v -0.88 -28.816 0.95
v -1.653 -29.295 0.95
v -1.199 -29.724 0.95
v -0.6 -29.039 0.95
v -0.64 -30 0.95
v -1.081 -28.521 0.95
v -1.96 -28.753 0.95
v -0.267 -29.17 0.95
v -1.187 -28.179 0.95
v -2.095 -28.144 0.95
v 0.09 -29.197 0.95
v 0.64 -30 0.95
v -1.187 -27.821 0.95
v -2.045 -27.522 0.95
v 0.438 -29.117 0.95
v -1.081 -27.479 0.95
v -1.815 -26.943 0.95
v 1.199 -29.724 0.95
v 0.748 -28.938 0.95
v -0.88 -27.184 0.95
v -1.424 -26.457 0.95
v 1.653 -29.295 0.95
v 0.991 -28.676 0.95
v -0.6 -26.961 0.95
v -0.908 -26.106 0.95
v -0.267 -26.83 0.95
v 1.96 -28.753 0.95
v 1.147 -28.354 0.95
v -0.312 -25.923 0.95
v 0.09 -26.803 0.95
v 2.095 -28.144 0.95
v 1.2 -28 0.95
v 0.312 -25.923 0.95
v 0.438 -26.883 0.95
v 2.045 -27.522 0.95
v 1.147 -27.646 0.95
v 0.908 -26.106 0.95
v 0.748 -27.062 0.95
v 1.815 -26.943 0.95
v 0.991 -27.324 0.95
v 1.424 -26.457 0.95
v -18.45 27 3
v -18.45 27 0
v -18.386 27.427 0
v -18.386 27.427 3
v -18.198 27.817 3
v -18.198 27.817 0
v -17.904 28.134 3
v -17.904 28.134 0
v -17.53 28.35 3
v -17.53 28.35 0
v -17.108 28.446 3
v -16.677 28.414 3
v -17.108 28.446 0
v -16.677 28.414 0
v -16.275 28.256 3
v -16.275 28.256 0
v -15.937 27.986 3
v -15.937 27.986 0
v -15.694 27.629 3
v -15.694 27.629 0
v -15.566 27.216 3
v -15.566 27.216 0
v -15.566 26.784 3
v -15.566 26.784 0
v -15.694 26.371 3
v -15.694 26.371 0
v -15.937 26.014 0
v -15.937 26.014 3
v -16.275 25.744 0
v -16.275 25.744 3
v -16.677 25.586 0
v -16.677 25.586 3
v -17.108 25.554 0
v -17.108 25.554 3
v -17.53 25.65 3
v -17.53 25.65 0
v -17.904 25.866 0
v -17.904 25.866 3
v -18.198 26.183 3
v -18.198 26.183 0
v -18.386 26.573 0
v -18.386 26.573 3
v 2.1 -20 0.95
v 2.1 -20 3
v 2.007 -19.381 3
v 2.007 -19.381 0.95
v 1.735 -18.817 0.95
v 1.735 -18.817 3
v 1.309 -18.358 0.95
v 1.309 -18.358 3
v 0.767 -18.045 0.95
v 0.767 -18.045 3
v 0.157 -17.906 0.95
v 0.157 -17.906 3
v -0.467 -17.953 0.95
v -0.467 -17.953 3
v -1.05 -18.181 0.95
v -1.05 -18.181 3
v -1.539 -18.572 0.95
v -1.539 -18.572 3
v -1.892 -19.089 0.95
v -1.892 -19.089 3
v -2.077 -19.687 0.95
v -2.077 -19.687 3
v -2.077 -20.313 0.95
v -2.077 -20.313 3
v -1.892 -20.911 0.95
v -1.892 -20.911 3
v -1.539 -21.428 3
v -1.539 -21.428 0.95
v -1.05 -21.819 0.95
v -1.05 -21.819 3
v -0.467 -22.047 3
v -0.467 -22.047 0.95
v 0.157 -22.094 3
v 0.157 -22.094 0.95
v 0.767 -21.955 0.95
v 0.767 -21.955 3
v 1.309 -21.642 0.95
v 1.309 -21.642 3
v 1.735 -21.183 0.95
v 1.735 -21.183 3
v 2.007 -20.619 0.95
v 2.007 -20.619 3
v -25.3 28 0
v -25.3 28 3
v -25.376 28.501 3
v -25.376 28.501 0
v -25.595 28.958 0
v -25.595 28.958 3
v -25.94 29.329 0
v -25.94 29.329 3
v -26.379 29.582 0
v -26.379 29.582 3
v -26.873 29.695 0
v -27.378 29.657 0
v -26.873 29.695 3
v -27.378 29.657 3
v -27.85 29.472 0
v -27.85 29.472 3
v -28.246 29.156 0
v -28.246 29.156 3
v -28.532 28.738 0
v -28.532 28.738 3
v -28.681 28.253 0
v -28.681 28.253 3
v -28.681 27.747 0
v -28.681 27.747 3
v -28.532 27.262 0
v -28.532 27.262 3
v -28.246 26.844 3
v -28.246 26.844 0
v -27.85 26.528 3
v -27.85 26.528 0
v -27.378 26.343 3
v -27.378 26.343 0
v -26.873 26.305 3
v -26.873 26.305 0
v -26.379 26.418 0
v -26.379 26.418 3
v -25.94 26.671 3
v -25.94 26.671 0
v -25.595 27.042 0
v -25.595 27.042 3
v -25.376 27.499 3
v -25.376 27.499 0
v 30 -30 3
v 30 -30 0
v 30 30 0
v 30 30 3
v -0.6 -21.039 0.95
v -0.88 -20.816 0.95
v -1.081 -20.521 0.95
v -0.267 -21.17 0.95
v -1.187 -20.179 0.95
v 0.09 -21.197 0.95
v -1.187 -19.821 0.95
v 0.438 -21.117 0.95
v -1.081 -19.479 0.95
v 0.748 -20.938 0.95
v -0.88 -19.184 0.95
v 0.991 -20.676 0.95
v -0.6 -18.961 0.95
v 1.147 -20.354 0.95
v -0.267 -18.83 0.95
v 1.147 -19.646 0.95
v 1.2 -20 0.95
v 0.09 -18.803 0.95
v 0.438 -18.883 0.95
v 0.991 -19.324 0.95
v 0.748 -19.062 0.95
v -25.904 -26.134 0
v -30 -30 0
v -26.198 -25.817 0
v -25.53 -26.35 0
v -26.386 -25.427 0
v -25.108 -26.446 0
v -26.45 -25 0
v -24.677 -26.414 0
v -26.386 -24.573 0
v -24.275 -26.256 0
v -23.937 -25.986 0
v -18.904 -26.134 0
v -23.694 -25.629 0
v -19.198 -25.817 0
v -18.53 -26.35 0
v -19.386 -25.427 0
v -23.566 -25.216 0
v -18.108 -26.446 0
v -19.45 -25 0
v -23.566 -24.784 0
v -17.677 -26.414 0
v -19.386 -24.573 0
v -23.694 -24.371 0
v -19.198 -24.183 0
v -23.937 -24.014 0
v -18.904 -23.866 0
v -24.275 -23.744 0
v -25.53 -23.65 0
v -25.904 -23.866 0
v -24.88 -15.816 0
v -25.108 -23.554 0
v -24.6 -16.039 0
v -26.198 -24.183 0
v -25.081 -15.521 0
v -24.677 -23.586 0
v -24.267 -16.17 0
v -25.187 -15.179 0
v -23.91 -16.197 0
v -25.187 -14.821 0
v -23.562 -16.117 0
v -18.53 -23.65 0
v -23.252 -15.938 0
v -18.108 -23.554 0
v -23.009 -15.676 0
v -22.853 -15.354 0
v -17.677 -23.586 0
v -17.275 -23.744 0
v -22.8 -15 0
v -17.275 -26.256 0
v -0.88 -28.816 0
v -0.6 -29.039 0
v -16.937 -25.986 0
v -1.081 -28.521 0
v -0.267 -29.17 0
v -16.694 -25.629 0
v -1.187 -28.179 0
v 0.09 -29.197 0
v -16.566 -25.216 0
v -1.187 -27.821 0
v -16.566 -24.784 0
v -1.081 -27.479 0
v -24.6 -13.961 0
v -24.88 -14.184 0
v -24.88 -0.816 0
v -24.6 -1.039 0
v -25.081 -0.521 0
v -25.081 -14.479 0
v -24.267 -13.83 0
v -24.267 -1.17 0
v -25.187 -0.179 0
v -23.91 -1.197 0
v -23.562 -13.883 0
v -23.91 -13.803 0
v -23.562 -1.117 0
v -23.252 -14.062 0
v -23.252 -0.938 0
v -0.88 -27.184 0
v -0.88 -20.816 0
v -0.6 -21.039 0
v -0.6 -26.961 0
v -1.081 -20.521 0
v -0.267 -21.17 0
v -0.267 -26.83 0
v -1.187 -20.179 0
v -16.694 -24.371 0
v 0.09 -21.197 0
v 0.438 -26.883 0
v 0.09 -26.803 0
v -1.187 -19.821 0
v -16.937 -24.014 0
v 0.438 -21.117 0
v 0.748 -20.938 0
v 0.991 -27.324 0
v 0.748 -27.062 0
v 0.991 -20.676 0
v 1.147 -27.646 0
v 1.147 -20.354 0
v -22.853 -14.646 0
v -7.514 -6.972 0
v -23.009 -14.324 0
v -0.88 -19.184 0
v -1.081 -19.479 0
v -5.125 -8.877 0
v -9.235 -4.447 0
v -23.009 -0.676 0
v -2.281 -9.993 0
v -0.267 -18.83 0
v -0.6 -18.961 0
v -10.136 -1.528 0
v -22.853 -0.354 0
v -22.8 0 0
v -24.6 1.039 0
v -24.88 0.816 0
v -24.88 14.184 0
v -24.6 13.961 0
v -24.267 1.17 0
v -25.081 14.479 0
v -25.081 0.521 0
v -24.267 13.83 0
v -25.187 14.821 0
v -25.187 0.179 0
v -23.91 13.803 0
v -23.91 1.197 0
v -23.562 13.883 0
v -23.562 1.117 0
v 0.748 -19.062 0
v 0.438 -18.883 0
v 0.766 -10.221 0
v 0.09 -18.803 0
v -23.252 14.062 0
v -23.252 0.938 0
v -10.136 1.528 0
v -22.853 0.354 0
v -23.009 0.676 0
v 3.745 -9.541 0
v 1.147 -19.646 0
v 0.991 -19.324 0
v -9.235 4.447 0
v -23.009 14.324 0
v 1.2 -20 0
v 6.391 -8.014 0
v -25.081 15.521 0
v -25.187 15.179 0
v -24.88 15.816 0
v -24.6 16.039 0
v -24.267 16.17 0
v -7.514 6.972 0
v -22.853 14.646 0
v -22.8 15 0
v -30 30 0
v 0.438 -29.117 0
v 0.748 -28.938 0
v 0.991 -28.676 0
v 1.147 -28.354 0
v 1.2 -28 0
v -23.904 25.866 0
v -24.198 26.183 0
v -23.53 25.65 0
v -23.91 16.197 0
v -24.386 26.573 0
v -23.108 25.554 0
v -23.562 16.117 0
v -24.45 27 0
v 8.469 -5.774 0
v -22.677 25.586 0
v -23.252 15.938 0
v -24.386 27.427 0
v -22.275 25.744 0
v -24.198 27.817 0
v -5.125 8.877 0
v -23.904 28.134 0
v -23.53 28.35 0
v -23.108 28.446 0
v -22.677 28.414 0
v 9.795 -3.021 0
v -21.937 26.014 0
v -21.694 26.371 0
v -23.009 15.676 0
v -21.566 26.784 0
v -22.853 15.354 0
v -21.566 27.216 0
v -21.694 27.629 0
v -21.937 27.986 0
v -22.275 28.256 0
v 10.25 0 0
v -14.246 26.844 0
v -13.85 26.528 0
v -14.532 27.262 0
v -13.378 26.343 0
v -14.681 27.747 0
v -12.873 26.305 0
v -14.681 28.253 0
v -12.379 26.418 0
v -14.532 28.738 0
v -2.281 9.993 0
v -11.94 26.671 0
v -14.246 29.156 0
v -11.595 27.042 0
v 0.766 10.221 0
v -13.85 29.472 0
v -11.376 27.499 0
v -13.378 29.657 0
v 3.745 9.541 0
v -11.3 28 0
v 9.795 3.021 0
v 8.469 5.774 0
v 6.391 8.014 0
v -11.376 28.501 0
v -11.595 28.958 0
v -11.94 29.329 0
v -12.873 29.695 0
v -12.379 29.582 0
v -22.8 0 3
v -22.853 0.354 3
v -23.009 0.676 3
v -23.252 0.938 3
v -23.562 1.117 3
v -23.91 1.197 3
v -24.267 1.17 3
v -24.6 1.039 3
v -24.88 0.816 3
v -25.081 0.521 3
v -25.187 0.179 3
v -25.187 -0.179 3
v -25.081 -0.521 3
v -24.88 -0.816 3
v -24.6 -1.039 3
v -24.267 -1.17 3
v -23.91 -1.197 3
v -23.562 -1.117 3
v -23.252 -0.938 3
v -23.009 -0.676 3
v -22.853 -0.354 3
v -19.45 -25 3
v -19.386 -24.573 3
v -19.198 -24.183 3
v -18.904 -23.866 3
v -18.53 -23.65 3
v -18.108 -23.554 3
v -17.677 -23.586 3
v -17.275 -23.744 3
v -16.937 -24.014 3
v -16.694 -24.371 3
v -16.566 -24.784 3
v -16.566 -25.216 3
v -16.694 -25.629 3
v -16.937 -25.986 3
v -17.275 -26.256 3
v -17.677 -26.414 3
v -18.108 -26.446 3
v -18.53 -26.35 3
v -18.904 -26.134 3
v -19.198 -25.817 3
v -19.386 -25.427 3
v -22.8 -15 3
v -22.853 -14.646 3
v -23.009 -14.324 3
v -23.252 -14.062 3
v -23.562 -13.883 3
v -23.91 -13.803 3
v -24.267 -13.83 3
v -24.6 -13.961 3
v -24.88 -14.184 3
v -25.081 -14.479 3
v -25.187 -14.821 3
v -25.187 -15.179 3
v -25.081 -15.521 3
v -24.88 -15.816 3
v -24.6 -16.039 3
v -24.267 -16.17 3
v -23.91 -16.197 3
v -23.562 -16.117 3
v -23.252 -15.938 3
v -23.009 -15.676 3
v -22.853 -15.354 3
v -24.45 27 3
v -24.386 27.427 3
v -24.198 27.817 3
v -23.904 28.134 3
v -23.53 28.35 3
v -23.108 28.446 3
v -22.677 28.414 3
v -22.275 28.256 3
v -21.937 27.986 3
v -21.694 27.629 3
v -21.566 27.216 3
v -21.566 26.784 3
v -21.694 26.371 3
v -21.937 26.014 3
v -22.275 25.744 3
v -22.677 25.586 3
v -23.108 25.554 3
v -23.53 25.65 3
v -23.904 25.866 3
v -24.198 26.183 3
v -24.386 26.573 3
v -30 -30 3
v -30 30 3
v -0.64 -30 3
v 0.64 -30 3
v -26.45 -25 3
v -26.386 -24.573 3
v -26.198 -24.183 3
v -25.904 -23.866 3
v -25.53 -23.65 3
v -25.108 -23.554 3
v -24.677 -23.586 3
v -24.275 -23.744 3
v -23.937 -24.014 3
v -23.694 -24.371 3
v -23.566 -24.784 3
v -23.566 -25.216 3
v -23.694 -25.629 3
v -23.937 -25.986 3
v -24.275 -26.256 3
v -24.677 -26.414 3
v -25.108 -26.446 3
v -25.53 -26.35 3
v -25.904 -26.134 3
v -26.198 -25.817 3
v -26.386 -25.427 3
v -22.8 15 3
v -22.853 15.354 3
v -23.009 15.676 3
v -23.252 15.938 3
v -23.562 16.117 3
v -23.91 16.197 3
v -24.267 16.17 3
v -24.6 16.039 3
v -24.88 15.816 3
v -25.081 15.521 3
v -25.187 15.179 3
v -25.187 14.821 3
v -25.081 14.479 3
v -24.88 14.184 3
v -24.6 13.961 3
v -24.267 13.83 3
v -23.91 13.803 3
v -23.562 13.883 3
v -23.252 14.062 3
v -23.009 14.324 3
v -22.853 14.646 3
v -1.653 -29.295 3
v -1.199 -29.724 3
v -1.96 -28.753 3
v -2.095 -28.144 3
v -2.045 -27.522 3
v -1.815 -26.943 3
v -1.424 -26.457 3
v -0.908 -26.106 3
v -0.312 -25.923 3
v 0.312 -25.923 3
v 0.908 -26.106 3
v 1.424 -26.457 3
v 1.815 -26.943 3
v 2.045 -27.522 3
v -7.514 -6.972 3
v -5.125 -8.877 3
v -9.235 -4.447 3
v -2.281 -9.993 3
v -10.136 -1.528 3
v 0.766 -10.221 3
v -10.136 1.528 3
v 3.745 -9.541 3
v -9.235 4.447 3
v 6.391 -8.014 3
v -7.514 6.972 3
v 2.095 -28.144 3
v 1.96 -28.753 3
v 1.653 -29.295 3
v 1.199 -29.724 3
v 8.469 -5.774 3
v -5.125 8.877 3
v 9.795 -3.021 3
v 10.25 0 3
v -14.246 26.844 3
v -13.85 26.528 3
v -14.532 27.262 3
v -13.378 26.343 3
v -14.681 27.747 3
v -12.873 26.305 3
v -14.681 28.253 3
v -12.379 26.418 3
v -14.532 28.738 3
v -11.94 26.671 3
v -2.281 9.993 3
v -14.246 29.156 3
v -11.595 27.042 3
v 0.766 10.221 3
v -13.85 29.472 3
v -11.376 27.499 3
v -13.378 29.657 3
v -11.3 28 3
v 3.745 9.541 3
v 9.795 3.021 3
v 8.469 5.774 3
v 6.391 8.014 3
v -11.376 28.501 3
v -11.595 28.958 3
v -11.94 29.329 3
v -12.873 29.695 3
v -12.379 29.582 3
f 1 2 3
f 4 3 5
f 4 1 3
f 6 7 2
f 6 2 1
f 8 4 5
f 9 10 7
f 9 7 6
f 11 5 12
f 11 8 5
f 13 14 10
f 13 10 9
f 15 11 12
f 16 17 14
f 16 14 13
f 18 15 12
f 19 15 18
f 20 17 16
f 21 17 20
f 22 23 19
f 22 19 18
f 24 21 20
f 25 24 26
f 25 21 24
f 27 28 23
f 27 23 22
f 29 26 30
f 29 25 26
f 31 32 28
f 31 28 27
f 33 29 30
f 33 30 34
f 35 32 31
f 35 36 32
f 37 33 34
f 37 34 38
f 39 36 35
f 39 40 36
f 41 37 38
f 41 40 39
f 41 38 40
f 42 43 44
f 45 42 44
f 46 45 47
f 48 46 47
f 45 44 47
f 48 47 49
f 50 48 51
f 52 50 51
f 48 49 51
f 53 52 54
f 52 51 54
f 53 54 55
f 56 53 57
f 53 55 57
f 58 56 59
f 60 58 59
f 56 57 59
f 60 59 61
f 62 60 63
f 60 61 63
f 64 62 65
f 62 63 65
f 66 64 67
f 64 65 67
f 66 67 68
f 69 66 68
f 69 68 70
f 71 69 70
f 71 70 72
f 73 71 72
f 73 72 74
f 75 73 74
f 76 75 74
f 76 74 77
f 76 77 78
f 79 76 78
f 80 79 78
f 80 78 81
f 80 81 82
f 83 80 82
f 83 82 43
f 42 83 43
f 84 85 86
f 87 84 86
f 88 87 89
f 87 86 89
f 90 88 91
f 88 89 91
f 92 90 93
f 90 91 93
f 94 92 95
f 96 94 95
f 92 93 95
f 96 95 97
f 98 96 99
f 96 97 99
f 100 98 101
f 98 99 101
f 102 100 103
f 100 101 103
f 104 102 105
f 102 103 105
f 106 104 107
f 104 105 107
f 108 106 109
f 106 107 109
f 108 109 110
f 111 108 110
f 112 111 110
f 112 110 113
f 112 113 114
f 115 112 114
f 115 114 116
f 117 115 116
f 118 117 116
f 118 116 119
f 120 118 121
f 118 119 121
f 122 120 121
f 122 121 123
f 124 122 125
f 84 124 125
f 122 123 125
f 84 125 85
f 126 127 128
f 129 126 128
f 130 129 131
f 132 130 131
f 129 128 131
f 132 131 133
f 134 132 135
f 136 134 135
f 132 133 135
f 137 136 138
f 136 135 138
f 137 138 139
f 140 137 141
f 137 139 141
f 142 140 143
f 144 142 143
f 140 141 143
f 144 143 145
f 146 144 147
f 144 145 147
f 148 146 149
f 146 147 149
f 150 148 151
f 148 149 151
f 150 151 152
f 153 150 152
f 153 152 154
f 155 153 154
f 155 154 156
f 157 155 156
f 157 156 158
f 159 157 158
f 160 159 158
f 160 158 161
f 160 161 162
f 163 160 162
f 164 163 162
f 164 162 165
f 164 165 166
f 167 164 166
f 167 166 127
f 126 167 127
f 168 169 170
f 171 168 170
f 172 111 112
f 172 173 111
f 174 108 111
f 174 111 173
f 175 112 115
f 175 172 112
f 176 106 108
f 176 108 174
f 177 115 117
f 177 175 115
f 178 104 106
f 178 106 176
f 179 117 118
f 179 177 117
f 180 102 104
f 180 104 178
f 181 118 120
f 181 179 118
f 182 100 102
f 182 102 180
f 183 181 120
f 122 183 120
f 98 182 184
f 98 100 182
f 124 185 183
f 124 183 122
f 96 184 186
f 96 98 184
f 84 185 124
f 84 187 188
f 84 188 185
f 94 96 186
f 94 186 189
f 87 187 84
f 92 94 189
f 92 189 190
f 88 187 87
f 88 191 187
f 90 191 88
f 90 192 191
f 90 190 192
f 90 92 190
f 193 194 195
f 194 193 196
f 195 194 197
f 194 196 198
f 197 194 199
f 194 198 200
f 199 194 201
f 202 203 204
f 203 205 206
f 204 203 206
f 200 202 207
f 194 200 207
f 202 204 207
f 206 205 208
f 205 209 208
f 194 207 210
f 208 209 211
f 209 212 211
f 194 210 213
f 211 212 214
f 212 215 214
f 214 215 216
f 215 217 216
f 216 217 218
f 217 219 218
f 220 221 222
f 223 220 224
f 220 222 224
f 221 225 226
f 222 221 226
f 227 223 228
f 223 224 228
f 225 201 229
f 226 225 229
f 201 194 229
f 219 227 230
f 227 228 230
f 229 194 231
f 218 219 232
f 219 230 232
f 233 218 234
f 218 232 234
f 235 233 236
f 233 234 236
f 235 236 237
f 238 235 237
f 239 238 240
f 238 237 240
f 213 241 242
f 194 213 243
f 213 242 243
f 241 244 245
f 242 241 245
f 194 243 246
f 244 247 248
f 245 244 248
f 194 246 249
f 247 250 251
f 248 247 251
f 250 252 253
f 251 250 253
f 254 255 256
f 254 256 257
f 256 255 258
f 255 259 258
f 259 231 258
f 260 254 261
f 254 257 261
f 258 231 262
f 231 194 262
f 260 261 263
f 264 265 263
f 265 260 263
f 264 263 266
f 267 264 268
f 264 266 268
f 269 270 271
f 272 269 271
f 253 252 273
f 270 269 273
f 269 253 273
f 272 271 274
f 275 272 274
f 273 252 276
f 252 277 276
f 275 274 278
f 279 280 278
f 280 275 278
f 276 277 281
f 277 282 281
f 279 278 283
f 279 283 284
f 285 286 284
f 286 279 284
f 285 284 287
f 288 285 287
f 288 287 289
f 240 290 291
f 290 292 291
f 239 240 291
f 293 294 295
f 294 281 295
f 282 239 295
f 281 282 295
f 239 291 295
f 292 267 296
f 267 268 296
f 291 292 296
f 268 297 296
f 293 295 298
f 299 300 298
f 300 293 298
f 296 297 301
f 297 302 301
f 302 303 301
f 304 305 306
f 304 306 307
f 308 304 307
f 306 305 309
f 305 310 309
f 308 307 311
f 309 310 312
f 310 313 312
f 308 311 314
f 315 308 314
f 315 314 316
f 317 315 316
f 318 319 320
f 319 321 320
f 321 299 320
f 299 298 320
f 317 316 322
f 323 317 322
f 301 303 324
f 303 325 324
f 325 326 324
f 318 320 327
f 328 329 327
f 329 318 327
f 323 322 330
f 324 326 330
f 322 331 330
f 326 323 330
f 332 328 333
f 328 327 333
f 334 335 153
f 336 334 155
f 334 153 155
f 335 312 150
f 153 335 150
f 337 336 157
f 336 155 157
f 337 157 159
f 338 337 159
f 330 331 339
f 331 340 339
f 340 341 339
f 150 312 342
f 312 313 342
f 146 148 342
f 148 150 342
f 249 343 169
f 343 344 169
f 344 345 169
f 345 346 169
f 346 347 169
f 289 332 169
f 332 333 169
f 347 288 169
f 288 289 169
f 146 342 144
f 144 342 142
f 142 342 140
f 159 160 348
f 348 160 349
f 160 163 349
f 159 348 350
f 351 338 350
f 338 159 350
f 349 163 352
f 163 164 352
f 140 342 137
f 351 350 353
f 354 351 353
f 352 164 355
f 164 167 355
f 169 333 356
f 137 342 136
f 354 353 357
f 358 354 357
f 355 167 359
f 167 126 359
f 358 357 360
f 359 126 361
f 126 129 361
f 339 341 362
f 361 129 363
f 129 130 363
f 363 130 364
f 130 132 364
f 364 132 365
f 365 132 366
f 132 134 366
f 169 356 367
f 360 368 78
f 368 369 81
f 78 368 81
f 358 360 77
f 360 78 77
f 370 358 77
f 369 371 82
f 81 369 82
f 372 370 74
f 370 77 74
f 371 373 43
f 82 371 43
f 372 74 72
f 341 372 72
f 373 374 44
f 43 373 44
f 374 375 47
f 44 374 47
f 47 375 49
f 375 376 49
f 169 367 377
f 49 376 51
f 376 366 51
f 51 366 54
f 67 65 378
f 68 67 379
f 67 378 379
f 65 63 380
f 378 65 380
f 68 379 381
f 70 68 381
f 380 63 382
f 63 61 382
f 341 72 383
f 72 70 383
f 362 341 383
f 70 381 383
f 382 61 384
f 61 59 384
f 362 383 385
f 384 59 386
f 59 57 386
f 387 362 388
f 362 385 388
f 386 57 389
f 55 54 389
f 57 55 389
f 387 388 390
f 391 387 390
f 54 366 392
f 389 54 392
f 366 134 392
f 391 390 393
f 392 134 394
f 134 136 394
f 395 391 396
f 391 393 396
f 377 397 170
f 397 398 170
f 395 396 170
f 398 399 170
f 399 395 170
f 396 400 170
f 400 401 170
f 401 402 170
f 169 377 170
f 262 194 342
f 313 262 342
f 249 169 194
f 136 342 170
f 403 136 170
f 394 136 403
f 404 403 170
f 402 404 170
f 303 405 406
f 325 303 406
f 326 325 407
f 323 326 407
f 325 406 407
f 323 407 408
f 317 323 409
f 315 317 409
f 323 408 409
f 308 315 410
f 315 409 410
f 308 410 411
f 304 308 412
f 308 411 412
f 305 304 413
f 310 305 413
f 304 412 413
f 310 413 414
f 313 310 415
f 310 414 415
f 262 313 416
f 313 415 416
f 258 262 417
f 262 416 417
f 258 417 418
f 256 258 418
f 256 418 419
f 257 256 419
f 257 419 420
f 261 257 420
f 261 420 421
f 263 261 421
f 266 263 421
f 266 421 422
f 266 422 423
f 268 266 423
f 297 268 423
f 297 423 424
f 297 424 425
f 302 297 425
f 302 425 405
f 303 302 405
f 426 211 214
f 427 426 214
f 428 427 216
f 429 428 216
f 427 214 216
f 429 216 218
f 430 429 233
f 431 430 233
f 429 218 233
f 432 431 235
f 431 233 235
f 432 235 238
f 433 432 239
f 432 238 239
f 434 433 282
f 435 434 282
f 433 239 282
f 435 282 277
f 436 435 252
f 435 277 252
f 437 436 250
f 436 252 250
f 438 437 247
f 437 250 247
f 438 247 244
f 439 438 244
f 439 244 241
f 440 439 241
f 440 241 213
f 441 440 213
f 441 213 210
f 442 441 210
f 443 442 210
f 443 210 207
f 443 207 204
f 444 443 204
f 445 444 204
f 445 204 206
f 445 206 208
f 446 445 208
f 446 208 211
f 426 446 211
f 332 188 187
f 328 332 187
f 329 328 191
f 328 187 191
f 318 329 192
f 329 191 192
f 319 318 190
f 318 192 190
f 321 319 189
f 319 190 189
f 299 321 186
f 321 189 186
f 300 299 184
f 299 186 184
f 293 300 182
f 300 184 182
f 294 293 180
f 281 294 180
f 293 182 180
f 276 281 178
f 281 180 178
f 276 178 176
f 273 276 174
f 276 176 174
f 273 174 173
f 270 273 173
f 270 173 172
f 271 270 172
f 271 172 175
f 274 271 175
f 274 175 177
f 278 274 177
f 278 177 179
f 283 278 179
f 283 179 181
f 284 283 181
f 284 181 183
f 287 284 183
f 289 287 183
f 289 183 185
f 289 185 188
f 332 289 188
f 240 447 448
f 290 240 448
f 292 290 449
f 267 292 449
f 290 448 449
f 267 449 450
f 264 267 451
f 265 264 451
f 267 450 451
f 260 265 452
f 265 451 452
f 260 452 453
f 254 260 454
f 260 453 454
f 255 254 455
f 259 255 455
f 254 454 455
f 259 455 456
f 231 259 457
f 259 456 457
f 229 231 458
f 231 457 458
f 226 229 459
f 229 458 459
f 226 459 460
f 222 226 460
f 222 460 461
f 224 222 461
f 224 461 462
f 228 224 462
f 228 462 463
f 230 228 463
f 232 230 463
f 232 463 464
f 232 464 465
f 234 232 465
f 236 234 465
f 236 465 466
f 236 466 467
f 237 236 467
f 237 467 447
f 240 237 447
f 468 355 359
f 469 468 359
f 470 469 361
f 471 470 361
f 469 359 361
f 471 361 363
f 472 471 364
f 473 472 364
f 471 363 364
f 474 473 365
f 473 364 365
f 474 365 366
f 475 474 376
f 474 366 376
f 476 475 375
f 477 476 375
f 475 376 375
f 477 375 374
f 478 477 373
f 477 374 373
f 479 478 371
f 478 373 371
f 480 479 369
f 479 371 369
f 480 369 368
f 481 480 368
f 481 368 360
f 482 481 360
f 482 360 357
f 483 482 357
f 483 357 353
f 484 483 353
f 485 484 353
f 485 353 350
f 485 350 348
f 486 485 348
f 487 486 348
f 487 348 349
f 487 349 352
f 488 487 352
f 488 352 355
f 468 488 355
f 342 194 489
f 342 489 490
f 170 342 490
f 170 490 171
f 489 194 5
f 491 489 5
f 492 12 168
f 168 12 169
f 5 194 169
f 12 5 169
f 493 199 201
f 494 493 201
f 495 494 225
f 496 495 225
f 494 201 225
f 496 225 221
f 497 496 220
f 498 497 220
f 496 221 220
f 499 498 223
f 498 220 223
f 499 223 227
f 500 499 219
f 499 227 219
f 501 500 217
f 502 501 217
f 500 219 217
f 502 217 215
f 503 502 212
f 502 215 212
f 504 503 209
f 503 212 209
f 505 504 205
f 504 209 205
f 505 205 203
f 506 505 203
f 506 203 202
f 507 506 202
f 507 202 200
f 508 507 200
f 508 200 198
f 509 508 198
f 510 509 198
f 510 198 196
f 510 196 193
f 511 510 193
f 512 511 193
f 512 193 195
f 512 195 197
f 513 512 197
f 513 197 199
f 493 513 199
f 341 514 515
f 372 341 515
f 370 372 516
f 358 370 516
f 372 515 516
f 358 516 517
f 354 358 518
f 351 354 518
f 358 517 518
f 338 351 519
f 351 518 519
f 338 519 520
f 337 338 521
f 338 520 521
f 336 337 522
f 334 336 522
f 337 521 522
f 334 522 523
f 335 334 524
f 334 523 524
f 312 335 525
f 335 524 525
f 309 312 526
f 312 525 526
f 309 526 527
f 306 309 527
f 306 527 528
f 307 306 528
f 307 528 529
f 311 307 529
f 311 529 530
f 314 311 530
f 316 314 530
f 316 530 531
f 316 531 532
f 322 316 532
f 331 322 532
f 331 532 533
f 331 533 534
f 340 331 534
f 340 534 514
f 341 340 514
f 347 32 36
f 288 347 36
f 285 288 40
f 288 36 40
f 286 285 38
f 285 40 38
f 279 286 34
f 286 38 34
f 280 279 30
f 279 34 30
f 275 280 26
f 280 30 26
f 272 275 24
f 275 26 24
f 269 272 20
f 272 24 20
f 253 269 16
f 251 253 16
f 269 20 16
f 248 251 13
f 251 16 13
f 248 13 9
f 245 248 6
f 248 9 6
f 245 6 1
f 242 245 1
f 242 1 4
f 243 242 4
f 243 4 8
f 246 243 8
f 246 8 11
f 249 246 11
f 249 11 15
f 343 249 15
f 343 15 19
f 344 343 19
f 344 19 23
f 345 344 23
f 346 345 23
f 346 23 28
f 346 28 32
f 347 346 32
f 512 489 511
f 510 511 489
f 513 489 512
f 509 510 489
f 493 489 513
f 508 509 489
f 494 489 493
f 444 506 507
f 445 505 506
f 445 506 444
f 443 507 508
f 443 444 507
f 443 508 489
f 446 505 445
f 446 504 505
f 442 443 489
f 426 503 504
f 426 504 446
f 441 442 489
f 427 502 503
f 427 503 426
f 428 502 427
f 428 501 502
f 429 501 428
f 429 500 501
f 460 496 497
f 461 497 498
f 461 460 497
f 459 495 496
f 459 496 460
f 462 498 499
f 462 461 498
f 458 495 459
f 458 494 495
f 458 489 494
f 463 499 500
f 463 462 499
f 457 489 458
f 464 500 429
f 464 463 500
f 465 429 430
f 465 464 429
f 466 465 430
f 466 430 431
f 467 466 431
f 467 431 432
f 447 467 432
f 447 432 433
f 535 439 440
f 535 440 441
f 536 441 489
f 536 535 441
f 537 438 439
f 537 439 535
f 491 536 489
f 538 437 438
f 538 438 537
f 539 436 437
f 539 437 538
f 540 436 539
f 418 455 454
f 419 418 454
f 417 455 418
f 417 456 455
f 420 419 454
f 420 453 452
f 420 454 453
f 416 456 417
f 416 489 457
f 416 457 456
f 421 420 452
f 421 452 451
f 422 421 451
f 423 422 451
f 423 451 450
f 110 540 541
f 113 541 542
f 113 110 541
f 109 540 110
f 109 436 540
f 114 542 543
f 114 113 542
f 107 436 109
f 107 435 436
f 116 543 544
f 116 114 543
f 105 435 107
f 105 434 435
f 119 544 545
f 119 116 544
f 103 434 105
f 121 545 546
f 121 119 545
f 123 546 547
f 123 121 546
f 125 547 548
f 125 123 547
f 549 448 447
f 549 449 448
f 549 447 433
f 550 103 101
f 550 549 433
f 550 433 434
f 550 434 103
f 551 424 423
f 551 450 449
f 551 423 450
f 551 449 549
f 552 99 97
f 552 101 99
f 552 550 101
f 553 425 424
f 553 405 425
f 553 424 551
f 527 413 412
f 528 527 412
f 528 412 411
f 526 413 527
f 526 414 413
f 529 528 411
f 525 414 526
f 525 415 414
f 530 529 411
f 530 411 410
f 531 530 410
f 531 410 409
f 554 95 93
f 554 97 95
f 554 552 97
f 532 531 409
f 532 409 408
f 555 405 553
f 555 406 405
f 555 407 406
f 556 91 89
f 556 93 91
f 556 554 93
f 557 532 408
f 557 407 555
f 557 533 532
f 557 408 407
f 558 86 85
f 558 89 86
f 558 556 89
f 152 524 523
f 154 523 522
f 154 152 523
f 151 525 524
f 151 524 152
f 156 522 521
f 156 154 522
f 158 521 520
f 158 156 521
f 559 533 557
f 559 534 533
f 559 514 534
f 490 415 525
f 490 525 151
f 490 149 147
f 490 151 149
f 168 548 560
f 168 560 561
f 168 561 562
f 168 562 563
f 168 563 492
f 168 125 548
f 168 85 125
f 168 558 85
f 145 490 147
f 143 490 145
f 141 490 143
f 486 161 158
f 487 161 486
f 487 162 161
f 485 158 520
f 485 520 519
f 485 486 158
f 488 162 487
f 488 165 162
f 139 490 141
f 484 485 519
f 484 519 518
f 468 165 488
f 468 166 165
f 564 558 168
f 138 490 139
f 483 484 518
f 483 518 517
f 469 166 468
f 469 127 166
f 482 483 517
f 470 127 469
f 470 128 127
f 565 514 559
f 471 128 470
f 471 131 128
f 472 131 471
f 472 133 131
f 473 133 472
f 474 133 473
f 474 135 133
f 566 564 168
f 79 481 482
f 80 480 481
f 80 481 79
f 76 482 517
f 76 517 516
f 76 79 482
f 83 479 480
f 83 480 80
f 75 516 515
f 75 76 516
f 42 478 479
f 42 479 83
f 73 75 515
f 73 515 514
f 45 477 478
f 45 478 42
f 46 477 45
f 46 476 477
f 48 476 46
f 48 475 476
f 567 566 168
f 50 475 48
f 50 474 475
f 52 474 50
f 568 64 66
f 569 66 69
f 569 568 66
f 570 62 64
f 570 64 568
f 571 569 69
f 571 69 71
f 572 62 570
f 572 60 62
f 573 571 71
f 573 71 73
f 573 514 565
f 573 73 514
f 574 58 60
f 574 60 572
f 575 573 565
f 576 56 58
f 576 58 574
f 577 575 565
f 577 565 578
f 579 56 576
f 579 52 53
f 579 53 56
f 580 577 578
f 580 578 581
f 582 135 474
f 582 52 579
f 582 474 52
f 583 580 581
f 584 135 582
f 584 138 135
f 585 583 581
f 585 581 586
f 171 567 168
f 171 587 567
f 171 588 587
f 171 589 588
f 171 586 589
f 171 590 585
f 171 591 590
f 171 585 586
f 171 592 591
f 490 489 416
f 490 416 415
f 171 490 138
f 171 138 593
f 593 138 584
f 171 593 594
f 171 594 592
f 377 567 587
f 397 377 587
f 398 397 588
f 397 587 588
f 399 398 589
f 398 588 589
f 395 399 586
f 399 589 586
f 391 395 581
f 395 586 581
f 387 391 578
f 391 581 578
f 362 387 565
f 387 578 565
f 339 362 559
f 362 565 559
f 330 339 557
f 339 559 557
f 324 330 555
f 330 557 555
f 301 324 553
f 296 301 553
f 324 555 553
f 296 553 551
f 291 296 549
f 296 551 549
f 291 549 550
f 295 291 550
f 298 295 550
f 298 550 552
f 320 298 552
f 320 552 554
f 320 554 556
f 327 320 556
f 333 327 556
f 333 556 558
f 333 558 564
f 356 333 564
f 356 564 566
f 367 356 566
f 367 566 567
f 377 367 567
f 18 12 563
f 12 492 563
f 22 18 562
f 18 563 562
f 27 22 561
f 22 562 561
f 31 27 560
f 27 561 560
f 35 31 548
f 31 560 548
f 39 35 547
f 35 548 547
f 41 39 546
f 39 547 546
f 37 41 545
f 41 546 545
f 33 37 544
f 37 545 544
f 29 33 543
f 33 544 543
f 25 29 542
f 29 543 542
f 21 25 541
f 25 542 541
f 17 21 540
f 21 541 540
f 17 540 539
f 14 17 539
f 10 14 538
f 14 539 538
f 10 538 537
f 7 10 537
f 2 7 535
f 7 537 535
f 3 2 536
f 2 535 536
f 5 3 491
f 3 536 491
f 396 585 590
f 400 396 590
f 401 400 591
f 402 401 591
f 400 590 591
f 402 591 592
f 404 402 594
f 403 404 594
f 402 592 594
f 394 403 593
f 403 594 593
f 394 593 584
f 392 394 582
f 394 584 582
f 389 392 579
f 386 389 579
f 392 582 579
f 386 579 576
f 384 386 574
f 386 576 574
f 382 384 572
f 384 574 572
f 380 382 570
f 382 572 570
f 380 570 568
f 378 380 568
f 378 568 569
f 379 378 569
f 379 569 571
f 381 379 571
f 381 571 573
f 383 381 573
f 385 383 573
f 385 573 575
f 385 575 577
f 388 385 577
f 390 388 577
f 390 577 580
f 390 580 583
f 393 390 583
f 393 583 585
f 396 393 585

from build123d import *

# Parameters (mm, degrees)
SKETCH1_W                                    = 60
SKETCH1_H                                    = 60
BOSS_EXTRUDE1_DEPTH                          = 3
SKETCH2_R                                    = 10.25
CUT_EXTRUDE1_DEPTH                           = 43.532340636
SKETCH3_R                                    = 1.45
SERVO_Y_MOUNT_D2P9_DEPTH                     = 3.01
SKETCH4_R                                    = 1.45
CUT_EXTRUDE5_DEPTH                           = 43.532340636
SKETCH5_R                                    = 1.2
GUIDERAIL1_D2P4_DEPTH                        = 3.01
SKETCH6_R                                    = 1.2
GUIDEBLOCK2_D2P4_DEPTH                       = 3.01
SKETCH7_R                                    = 2.1
GUIDEBLOCK2_HEADCOUNTERBORE_D4P2_DEPTH       = 2.05
SKETCH8_R                                    = 1.7
BENCH_XDROP_M3_CLEARANCE_HOLES_2X_D3P4_DEPTH = 3.5


with BuildPart() as part:
    # Sketch1 → Boss-Extrude1 (new body)
    with BuildSketch(Plane.XY):
        Rectangle(SKETCH1_W, SKETCH1_H)
    extrude(amount=BOSS_EXTRUDE1_DEPTH)

    # Sketch2 → Cut-Extrude1 (cut, through all)
    with BuildSketch(Plane.XY.offset(3)):
        Circle(SKETCH2_R)
    extrude(amount=-CUT_EXTRUDE1_DEPTH, mode=Mode.SUBTRACT)

    # Sketch3 → Servo_Y_Mount_D2p9 (cut)
    with BuildSketch(Plane(origin=(0, 0, 0), x_dir=(-1, 0, 0), z_dir=(0, 0, -1))):
        with Locations((18, -25)):
            Circle(SKETCH3_R)
        with Locations((25, -25)):
            Circle(SKETCH3_R)
    extrude(amount=-SERVO_Y_MOUNT_D2P9_DEPTH, mode=Mode.SUBTRACT)

    # Sketch4 → Cut-Extrude5 (cut, through all)
    with BuildSketch(Plane(origin=(0, 0, 0), x_dir=(-1, 0, 0), z_dir=(0, 0, -1))):
        with Locations((17, 27)):
            Circle(SKETCH4_R)
        with Locations((23, 27)):
            Circle(SKETCH4_R)
    extrude(amount=-CUT_EXTRUDE5_DEPTH, mode=Mode.SUBTRACT)

    # Sketch5 → GuideRail1_D2p4 (cut)
    with BuildSketch(Plane.XY.offset(3)):
        with Locations((-24, -15)):
            Circle(SKETCH5_R)
        with Locations((-24, 0)):
            Circle(SKETCH5_R)
        with Locations((-24, 15)):
            Circle(SKETCH5_R)
    extrude(amount=-GUIDERAIL1_D2P4_DEPTH, mode=Mode.SUBTRACT)

    # Sketch6 → GuideBlock2_D2p4 (cut)
    with BuildSketch(Plane.XY.offset(3)):
        with Locations((0, -28)):
            Circle(SKETCH6_R)
        with Locations((0, -20)):
            Circle(SKETCH6_R)
    extrude(amount=-GUIDEBLOCK2_D2P4_DEPTH, mode=Mode.SUBTRACT)

    # Sketch7 → GuideBlock2_HeadCounterbore_D4p2 (cut)
    with BuildSketch(Plane.XY.offset(3)):
        with Locations((0, -28)):
            Circle(SKETCH7_R)
        with Locations((0, -20)):
            Circle(SKETCH7_R)
    extrude(amount=-GUIDEBLOCK2_HEADCOUNTERBORE_D4P2_DEPTH, mode=Mode.SUBTRACT)

    # Sketch8 → Bench_XDrop_M3_Clearance_Holes_2x_D3p4 (cut)
    with BuildSketch(Plane.XY.offset(3)):
        with Locations((-27, 28)):
            Circle(SKETCH8_R)
        with Locations((-13, 28)):
            Circle(SKETCH8_R)
    extrude(amount=-BENCH_XDROP_M3_CLEARANCE_HOLES_2X_D3P4_DEPTH, mode=Mode.SUBTRACT)


solid = part.part
